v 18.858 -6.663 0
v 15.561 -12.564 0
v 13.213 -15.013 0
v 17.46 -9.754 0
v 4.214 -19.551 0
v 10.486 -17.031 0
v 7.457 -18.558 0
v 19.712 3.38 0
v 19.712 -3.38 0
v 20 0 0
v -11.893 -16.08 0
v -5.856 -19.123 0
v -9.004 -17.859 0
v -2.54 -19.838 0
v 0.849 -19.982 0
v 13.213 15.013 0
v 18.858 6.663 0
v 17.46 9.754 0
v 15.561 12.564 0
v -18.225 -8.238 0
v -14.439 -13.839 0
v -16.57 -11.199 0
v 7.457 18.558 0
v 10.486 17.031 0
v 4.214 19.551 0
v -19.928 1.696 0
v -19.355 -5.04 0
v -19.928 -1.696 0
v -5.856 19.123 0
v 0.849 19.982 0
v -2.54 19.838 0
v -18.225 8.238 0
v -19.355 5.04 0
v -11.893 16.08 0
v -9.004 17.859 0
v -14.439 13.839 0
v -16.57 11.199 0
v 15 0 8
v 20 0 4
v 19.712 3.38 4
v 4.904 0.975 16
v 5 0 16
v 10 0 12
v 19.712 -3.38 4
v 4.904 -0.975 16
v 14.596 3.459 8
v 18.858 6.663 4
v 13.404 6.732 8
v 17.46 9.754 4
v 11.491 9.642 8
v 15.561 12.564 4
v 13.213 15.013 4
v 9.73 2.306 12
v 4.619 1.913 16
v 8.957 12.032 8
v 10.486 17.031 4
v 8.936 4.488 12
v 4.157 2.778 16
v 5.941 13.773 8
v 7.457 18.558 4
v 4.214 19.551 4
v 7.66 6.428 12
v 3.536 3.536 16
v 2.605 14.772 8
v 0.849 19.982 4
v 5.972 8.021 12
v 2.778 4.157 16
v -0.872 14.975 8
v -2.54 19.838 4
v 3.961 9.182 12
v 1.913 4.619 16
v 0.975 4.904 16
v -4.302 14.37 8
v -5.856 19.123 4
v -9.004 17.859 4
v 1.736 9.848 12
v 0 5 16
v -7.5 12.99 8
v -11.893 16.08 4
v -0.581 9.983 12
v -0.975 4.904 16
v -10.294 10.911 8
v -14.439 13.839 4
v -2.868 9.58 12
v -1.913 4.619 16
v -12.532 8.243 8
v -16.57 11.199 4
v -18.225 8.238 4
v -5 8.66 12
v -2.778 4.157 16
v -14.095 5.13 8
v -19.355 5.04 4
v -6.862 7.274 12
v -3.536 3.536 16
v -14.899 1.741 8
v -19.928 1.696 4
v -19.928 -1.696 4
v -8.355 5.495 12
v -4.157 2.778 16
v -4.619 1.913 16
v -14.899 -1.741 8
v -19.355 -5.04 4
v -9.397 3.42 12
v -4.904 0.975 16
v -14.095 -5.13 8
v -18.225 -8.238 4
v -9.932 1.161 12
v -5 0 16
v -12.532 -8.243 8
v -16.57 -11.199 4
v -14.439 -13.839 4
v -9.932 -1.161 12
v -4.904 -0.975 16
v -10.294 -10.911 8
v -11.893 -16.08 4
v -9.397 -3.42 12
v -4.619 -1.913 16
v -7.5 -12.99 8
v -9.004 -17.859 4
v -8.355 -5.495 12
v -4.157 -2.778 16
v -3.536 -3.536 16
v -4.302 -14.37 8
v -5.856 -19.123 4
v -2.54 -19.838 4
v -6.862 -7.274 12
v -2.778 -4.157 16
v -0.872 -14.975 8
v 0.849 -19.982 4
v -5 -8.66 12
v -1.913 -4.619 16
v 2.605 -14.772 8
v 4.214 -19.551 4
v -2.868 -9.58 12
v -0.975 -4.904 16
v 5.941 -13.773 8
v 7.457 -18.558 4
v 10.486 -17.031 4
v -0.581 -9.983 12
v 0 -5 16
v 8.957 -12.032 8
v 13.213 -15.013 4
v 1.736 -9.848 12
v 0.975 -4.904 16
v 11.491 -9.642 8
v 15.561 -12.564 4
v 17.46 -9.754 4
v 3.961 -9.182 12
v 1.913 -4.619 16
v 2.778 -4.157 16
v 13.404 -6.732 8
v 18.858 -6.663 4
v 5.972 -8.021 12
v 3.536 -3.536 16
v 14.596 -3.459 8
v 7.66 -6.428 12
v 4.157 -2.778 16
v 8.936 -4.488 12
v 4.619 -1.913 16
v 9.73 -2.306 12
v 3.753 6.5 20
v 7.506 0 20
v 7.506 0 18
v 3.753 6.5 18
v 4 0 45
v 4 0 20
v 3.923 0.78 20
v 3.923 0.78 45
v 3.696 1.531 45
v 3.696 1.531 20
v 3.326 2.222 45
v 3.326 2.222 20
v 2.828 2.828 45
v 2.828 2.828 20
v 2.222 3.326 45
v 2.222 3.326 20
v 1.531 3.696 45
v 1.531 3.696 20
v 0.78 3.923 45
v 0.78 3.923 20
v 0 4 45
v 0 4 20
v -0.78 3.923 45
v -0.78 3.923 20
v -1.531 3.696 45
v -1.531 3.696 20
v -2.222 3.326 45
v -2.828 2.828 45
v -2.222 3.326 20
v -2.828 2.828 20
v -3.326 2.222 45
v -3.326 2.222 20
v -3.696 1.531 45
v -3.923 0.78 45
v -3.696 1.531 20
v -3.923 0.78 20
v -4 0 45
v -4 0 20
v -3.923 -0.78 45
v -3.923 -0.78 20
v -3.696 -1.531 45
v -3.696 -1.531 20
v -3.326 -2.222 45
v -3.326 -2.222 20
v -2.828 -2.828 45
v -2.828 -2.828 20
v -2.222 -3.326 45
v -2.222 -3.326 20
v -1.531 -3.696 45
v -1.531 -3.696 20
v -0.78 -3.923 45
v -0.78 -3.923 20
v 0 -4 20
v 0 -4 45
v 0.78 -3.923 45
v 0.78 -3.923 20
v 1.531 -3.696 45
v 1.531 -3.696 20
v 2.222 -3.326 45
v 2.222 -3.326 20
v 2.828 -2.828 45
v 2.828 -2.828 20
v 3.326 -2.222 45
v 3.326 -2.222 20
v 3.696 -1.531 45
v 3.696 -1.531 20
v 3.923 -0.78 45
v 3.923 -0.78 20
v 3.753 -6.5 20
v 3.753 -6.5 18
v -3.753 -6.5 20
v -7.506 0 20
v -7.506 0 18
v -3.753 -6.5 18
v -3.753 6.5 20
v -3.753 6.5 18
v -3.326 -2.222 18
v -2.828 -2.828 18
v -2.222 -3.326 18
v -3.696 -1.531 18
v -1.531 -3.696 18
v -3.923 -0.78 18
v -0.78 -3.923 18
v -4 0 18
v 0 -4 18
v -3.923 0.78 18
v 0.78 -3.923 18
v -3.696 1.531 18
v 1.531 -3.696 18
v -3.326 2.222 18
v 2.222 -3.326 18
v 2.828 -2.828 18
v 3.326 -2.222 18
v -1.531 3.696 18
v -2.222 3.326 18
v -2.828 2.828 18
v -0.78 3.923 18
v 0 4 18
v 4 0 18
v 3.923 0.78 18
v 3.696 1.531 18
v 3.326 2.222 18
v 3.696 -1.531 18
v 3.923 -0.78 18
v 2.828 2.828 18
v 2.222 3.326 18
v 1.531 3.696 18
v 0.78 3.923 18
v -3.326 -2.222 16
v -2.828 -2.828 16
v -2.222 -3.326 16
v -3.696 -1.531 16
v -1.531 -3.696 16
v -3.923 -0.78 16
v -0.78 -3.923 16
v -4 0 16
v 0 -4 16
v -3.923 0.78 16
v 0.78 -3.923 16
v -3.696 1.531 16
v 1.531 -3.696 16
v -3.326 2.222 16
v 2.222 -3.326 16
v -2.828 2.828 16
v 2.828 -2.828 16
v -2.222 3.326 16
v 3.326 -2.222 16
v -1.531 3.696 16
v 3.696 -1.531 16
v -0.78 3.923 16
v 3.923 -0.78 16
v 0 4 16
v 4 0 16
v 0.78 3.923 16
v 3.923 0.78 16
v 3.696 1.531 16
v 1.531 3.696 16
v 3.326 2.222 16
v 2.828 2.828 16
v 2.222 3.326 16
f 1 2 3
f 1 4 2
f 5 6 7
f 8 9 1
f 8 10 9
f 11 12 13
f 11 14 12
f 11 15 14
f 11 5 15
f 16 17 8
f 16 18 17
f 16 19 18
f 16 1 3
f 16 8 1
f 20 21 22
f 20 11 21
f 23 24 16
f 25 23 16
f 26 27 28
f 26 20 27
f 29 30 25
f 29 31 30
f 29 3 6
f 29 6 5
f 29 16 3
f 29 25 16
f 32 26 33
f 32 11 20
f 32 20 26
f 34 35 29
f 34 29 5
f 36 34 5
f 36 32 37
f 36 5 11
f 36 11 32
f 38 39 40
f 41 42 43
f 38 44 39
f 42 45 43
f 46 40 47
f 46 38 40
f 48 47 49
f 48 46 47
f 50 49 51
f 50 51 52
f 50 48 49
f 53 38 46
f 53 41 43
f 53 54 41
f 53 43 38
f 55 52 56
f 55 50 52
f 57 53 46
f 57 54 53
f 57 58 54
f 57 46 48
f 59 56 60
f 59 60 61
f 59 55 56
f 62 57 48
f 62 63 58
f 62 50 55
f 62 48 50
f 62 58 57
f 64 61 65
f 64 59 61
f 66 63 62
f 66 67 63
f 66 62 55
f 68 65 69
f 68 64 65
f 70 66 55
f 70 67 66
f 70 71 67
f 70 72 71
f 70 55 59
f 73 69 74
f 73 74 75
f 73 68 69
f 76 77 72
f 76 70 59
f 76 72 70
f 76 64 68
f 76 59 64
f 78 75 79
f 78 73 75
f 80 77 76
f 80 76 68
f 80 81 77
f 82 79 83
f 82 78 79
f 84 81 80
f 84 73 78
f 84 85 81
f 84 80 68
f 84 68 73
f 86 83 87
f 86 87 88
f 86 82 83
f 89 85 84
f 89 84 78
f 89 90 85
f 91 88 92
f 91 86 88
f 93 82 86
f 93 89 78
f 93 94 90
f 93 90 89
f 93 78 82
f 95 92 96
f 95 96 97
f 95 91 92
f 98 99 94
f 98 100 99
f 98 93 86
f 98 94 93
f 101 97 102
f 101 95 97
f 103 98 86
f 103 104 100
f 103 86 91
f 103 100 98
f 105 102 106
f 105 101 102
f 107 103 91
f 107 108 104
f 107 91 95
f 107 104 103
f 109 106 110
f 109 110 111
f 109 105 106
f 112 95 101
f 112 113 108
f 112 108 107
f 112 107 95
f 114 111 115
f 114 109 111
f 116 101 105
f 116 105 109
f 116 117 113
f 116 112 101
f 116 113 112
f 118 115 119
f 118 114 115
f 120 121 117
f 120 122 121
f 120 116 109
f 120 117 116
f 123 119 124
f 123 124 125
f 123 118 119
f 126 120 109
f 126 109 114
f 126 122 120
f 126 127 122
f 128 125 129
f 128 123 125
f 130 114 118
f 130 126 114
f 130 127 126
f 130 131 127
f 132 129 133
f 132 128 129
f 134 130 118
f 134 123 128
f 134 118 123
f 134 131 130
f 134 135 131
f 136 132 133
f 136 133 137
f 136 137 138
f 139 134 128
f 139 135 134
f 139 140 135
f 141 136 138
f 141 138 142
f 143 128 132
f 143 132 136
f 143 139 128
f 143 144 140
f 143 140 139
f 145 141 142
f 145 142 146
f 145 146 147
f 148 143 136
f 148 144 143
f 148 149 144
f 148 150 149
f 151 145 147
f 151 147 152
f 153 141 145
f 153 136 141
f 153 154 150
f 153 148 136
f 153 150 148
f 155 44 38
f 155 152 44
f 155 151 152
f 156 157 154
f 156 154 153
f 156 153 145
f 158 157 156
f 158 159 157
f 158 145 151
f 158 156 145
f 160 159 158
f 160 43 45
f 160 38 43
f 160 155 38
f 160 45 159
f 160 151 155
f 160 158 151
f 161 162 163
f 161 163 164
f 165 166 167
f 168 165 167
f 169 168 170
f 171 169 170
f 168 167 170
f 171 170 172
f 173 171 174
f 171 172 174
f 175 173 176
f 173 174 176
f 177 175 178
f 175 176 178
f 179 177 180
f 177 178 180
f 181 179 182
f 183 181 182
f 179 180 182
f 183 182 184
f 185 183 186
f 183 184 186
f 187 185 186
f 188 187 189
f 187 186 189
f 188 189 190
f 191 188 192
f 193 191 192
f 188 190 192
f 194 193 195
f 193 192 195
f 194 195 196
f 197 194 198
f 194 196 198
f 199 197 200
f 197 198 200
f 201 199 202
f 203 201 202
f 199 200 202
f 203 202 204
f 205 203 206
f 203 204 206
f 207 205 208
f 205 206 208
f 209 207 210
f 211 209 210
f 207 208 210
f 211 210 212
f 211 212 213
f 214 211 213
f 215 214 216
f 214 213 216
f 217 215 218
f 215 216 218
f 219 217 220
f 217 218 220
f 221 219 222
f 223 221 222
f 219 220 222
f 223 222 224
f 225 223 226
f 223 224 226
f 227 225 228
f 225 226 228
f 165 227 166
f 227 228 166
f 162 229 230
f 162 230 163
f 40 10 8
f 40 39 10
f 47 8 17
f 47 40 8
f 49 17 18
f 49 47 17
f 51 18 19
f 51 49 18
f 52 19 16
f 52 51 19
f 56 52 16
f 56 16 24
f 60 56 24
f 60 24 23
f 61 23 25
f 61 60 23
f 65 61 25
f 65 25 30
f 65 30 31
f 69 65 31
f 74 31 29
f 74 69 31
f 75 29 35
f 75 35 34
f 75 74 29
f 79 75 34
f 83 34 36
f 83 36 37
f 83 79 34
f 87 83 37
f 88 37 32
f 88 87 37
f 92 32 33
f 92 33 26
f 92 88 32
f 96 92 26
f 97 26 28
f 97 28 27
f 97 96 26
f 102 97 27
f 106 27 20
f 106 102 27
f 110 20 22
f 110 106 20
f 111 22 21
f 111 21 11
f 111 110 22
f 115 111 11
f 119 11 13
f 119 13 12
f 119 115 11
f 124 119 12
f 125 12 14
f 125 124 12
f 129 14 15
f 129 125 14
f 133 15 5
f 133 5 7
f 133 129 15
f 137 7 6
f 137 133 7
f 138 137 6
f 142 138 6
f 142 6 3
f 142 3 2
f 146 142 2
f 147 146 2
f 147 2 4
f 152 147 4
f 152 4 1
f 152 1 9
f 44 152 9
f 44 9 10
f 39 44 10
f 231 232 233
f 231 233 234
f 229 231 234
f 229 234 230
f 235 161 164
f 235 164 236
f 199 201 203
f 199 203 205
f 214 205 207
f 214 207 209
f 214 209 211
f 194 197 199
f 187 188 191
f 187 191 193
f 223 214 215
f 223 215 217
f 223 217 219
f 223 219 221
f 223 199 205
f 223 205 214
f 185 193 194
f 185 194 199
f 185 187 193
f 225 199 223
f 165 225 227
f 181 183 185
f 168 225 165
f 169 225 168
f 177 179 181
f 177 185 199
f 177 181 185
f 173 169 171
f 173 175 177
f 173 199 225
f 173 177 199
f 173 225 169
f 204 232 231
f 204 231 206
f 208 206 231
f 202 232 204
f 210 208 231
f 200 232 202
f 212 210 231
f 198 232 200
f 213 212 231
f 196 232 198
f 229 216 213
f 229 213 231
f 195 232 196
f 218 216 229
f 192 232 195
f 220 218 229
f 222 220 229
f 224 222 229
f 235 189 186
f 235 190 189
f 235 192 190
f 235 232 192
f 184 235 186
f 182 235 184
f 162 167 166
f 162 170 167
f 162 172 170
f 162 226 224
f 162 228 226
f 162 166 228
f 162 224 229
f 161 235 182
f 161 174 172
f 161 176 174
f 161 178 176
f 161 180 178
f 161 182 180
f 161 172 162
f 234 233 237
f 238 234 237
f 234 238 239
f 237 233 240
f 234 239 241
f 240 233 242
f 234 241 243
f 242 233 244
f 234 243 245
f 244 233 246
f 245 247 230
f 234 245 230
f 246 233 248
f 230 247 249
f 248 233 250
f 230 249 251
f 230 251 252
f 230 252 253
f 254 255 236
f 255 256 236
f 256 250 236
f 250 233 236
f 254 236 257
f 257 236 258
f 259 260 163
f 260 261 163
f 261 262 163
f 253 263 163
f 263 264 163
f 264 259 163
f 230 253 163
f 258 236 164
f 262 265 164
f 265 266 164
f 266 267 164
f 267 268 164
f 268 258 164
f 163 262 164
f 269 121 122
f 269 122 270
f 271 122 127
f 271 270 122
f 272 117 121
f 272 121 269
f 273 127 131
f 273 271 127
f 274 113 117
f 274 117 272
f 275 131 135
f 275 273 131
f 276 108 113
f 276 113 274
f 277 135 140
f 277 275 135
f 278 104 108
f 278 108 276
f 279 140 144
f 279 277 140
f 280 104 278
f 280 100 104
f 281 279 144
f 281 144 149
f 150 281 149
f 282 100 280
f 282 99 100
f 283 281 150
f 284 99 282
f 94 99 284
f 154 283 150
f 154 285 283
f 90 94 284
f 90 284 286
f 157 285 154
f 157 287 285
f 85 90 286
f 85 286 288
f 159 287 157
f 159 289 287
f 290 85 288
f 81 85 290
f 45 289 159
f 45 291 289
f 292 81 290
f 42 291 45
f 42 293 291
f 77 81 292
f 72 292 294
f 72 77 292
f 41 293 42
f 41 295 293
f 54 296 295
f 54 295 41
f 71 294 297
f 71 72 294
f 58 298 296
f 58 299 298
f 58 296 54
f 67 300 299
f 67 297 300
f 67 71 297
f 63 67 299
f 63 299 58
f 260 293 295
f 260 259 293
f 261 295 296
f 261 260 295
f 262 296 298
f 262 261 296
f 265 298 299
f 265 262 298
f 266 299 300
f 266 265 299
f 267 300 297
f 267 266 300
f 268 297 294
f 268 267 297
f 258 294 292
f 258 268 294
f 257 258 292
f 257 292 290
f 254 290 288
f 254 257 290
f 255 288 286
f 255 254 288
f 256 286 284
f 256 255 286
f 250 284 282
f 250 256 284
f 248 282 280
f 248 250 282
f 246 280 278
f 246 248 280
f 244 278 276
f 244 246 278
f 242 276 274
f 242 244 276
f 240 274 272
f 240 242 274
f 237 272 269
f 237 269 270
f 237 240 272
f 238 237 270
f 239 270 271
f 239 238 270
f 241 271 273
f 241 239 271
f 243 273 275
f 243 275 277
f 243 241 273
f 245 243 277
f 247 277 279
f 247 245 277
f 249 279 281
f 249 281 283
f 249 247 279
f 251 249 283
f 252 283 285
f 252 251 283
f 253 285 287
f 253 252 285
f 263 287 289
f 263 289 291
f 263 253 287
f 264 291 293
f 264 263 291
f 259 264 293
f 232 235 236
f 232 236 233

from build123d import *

# Parameters (mm, degrees)
PAD_DEPTH    = 2
SKETCH003_R  = 4
PAD001_DEPTH = 25


with BuildPart() as part:
    # Sketch → Revolution (revolve)
    with BuildSketch(Plane.XZ):
        Polygon((0, 0), (20, 0), (20, 4), (5, 16), (4, 16), (4, 18), (0, 18), align=None)
    revolve(axis=Axis((0, 0, 0), (0, 0, 1)))

    # Sketch002 (on DatumPlane) → Pad (new body)
    with BuildSketch(Plane.XY.offset(20)):
        Polygon((-3.752777, 6.5), (-7.505553, 0), (-3.752777, -6.5), (3.752777, -6.5), (7.505553, 0), (3.752777, 6.5), align=None)
    extrude(amount=-PAD_DEPTH)

    # Sketch003 (on DatumPlane) → Pad001 (join)
    with BuildSketch(Plane.XY.offset(20)):
        Circle(SKETCH003_R)
    extrude(amount=PAD001_DEPTH)


solid = part.part
